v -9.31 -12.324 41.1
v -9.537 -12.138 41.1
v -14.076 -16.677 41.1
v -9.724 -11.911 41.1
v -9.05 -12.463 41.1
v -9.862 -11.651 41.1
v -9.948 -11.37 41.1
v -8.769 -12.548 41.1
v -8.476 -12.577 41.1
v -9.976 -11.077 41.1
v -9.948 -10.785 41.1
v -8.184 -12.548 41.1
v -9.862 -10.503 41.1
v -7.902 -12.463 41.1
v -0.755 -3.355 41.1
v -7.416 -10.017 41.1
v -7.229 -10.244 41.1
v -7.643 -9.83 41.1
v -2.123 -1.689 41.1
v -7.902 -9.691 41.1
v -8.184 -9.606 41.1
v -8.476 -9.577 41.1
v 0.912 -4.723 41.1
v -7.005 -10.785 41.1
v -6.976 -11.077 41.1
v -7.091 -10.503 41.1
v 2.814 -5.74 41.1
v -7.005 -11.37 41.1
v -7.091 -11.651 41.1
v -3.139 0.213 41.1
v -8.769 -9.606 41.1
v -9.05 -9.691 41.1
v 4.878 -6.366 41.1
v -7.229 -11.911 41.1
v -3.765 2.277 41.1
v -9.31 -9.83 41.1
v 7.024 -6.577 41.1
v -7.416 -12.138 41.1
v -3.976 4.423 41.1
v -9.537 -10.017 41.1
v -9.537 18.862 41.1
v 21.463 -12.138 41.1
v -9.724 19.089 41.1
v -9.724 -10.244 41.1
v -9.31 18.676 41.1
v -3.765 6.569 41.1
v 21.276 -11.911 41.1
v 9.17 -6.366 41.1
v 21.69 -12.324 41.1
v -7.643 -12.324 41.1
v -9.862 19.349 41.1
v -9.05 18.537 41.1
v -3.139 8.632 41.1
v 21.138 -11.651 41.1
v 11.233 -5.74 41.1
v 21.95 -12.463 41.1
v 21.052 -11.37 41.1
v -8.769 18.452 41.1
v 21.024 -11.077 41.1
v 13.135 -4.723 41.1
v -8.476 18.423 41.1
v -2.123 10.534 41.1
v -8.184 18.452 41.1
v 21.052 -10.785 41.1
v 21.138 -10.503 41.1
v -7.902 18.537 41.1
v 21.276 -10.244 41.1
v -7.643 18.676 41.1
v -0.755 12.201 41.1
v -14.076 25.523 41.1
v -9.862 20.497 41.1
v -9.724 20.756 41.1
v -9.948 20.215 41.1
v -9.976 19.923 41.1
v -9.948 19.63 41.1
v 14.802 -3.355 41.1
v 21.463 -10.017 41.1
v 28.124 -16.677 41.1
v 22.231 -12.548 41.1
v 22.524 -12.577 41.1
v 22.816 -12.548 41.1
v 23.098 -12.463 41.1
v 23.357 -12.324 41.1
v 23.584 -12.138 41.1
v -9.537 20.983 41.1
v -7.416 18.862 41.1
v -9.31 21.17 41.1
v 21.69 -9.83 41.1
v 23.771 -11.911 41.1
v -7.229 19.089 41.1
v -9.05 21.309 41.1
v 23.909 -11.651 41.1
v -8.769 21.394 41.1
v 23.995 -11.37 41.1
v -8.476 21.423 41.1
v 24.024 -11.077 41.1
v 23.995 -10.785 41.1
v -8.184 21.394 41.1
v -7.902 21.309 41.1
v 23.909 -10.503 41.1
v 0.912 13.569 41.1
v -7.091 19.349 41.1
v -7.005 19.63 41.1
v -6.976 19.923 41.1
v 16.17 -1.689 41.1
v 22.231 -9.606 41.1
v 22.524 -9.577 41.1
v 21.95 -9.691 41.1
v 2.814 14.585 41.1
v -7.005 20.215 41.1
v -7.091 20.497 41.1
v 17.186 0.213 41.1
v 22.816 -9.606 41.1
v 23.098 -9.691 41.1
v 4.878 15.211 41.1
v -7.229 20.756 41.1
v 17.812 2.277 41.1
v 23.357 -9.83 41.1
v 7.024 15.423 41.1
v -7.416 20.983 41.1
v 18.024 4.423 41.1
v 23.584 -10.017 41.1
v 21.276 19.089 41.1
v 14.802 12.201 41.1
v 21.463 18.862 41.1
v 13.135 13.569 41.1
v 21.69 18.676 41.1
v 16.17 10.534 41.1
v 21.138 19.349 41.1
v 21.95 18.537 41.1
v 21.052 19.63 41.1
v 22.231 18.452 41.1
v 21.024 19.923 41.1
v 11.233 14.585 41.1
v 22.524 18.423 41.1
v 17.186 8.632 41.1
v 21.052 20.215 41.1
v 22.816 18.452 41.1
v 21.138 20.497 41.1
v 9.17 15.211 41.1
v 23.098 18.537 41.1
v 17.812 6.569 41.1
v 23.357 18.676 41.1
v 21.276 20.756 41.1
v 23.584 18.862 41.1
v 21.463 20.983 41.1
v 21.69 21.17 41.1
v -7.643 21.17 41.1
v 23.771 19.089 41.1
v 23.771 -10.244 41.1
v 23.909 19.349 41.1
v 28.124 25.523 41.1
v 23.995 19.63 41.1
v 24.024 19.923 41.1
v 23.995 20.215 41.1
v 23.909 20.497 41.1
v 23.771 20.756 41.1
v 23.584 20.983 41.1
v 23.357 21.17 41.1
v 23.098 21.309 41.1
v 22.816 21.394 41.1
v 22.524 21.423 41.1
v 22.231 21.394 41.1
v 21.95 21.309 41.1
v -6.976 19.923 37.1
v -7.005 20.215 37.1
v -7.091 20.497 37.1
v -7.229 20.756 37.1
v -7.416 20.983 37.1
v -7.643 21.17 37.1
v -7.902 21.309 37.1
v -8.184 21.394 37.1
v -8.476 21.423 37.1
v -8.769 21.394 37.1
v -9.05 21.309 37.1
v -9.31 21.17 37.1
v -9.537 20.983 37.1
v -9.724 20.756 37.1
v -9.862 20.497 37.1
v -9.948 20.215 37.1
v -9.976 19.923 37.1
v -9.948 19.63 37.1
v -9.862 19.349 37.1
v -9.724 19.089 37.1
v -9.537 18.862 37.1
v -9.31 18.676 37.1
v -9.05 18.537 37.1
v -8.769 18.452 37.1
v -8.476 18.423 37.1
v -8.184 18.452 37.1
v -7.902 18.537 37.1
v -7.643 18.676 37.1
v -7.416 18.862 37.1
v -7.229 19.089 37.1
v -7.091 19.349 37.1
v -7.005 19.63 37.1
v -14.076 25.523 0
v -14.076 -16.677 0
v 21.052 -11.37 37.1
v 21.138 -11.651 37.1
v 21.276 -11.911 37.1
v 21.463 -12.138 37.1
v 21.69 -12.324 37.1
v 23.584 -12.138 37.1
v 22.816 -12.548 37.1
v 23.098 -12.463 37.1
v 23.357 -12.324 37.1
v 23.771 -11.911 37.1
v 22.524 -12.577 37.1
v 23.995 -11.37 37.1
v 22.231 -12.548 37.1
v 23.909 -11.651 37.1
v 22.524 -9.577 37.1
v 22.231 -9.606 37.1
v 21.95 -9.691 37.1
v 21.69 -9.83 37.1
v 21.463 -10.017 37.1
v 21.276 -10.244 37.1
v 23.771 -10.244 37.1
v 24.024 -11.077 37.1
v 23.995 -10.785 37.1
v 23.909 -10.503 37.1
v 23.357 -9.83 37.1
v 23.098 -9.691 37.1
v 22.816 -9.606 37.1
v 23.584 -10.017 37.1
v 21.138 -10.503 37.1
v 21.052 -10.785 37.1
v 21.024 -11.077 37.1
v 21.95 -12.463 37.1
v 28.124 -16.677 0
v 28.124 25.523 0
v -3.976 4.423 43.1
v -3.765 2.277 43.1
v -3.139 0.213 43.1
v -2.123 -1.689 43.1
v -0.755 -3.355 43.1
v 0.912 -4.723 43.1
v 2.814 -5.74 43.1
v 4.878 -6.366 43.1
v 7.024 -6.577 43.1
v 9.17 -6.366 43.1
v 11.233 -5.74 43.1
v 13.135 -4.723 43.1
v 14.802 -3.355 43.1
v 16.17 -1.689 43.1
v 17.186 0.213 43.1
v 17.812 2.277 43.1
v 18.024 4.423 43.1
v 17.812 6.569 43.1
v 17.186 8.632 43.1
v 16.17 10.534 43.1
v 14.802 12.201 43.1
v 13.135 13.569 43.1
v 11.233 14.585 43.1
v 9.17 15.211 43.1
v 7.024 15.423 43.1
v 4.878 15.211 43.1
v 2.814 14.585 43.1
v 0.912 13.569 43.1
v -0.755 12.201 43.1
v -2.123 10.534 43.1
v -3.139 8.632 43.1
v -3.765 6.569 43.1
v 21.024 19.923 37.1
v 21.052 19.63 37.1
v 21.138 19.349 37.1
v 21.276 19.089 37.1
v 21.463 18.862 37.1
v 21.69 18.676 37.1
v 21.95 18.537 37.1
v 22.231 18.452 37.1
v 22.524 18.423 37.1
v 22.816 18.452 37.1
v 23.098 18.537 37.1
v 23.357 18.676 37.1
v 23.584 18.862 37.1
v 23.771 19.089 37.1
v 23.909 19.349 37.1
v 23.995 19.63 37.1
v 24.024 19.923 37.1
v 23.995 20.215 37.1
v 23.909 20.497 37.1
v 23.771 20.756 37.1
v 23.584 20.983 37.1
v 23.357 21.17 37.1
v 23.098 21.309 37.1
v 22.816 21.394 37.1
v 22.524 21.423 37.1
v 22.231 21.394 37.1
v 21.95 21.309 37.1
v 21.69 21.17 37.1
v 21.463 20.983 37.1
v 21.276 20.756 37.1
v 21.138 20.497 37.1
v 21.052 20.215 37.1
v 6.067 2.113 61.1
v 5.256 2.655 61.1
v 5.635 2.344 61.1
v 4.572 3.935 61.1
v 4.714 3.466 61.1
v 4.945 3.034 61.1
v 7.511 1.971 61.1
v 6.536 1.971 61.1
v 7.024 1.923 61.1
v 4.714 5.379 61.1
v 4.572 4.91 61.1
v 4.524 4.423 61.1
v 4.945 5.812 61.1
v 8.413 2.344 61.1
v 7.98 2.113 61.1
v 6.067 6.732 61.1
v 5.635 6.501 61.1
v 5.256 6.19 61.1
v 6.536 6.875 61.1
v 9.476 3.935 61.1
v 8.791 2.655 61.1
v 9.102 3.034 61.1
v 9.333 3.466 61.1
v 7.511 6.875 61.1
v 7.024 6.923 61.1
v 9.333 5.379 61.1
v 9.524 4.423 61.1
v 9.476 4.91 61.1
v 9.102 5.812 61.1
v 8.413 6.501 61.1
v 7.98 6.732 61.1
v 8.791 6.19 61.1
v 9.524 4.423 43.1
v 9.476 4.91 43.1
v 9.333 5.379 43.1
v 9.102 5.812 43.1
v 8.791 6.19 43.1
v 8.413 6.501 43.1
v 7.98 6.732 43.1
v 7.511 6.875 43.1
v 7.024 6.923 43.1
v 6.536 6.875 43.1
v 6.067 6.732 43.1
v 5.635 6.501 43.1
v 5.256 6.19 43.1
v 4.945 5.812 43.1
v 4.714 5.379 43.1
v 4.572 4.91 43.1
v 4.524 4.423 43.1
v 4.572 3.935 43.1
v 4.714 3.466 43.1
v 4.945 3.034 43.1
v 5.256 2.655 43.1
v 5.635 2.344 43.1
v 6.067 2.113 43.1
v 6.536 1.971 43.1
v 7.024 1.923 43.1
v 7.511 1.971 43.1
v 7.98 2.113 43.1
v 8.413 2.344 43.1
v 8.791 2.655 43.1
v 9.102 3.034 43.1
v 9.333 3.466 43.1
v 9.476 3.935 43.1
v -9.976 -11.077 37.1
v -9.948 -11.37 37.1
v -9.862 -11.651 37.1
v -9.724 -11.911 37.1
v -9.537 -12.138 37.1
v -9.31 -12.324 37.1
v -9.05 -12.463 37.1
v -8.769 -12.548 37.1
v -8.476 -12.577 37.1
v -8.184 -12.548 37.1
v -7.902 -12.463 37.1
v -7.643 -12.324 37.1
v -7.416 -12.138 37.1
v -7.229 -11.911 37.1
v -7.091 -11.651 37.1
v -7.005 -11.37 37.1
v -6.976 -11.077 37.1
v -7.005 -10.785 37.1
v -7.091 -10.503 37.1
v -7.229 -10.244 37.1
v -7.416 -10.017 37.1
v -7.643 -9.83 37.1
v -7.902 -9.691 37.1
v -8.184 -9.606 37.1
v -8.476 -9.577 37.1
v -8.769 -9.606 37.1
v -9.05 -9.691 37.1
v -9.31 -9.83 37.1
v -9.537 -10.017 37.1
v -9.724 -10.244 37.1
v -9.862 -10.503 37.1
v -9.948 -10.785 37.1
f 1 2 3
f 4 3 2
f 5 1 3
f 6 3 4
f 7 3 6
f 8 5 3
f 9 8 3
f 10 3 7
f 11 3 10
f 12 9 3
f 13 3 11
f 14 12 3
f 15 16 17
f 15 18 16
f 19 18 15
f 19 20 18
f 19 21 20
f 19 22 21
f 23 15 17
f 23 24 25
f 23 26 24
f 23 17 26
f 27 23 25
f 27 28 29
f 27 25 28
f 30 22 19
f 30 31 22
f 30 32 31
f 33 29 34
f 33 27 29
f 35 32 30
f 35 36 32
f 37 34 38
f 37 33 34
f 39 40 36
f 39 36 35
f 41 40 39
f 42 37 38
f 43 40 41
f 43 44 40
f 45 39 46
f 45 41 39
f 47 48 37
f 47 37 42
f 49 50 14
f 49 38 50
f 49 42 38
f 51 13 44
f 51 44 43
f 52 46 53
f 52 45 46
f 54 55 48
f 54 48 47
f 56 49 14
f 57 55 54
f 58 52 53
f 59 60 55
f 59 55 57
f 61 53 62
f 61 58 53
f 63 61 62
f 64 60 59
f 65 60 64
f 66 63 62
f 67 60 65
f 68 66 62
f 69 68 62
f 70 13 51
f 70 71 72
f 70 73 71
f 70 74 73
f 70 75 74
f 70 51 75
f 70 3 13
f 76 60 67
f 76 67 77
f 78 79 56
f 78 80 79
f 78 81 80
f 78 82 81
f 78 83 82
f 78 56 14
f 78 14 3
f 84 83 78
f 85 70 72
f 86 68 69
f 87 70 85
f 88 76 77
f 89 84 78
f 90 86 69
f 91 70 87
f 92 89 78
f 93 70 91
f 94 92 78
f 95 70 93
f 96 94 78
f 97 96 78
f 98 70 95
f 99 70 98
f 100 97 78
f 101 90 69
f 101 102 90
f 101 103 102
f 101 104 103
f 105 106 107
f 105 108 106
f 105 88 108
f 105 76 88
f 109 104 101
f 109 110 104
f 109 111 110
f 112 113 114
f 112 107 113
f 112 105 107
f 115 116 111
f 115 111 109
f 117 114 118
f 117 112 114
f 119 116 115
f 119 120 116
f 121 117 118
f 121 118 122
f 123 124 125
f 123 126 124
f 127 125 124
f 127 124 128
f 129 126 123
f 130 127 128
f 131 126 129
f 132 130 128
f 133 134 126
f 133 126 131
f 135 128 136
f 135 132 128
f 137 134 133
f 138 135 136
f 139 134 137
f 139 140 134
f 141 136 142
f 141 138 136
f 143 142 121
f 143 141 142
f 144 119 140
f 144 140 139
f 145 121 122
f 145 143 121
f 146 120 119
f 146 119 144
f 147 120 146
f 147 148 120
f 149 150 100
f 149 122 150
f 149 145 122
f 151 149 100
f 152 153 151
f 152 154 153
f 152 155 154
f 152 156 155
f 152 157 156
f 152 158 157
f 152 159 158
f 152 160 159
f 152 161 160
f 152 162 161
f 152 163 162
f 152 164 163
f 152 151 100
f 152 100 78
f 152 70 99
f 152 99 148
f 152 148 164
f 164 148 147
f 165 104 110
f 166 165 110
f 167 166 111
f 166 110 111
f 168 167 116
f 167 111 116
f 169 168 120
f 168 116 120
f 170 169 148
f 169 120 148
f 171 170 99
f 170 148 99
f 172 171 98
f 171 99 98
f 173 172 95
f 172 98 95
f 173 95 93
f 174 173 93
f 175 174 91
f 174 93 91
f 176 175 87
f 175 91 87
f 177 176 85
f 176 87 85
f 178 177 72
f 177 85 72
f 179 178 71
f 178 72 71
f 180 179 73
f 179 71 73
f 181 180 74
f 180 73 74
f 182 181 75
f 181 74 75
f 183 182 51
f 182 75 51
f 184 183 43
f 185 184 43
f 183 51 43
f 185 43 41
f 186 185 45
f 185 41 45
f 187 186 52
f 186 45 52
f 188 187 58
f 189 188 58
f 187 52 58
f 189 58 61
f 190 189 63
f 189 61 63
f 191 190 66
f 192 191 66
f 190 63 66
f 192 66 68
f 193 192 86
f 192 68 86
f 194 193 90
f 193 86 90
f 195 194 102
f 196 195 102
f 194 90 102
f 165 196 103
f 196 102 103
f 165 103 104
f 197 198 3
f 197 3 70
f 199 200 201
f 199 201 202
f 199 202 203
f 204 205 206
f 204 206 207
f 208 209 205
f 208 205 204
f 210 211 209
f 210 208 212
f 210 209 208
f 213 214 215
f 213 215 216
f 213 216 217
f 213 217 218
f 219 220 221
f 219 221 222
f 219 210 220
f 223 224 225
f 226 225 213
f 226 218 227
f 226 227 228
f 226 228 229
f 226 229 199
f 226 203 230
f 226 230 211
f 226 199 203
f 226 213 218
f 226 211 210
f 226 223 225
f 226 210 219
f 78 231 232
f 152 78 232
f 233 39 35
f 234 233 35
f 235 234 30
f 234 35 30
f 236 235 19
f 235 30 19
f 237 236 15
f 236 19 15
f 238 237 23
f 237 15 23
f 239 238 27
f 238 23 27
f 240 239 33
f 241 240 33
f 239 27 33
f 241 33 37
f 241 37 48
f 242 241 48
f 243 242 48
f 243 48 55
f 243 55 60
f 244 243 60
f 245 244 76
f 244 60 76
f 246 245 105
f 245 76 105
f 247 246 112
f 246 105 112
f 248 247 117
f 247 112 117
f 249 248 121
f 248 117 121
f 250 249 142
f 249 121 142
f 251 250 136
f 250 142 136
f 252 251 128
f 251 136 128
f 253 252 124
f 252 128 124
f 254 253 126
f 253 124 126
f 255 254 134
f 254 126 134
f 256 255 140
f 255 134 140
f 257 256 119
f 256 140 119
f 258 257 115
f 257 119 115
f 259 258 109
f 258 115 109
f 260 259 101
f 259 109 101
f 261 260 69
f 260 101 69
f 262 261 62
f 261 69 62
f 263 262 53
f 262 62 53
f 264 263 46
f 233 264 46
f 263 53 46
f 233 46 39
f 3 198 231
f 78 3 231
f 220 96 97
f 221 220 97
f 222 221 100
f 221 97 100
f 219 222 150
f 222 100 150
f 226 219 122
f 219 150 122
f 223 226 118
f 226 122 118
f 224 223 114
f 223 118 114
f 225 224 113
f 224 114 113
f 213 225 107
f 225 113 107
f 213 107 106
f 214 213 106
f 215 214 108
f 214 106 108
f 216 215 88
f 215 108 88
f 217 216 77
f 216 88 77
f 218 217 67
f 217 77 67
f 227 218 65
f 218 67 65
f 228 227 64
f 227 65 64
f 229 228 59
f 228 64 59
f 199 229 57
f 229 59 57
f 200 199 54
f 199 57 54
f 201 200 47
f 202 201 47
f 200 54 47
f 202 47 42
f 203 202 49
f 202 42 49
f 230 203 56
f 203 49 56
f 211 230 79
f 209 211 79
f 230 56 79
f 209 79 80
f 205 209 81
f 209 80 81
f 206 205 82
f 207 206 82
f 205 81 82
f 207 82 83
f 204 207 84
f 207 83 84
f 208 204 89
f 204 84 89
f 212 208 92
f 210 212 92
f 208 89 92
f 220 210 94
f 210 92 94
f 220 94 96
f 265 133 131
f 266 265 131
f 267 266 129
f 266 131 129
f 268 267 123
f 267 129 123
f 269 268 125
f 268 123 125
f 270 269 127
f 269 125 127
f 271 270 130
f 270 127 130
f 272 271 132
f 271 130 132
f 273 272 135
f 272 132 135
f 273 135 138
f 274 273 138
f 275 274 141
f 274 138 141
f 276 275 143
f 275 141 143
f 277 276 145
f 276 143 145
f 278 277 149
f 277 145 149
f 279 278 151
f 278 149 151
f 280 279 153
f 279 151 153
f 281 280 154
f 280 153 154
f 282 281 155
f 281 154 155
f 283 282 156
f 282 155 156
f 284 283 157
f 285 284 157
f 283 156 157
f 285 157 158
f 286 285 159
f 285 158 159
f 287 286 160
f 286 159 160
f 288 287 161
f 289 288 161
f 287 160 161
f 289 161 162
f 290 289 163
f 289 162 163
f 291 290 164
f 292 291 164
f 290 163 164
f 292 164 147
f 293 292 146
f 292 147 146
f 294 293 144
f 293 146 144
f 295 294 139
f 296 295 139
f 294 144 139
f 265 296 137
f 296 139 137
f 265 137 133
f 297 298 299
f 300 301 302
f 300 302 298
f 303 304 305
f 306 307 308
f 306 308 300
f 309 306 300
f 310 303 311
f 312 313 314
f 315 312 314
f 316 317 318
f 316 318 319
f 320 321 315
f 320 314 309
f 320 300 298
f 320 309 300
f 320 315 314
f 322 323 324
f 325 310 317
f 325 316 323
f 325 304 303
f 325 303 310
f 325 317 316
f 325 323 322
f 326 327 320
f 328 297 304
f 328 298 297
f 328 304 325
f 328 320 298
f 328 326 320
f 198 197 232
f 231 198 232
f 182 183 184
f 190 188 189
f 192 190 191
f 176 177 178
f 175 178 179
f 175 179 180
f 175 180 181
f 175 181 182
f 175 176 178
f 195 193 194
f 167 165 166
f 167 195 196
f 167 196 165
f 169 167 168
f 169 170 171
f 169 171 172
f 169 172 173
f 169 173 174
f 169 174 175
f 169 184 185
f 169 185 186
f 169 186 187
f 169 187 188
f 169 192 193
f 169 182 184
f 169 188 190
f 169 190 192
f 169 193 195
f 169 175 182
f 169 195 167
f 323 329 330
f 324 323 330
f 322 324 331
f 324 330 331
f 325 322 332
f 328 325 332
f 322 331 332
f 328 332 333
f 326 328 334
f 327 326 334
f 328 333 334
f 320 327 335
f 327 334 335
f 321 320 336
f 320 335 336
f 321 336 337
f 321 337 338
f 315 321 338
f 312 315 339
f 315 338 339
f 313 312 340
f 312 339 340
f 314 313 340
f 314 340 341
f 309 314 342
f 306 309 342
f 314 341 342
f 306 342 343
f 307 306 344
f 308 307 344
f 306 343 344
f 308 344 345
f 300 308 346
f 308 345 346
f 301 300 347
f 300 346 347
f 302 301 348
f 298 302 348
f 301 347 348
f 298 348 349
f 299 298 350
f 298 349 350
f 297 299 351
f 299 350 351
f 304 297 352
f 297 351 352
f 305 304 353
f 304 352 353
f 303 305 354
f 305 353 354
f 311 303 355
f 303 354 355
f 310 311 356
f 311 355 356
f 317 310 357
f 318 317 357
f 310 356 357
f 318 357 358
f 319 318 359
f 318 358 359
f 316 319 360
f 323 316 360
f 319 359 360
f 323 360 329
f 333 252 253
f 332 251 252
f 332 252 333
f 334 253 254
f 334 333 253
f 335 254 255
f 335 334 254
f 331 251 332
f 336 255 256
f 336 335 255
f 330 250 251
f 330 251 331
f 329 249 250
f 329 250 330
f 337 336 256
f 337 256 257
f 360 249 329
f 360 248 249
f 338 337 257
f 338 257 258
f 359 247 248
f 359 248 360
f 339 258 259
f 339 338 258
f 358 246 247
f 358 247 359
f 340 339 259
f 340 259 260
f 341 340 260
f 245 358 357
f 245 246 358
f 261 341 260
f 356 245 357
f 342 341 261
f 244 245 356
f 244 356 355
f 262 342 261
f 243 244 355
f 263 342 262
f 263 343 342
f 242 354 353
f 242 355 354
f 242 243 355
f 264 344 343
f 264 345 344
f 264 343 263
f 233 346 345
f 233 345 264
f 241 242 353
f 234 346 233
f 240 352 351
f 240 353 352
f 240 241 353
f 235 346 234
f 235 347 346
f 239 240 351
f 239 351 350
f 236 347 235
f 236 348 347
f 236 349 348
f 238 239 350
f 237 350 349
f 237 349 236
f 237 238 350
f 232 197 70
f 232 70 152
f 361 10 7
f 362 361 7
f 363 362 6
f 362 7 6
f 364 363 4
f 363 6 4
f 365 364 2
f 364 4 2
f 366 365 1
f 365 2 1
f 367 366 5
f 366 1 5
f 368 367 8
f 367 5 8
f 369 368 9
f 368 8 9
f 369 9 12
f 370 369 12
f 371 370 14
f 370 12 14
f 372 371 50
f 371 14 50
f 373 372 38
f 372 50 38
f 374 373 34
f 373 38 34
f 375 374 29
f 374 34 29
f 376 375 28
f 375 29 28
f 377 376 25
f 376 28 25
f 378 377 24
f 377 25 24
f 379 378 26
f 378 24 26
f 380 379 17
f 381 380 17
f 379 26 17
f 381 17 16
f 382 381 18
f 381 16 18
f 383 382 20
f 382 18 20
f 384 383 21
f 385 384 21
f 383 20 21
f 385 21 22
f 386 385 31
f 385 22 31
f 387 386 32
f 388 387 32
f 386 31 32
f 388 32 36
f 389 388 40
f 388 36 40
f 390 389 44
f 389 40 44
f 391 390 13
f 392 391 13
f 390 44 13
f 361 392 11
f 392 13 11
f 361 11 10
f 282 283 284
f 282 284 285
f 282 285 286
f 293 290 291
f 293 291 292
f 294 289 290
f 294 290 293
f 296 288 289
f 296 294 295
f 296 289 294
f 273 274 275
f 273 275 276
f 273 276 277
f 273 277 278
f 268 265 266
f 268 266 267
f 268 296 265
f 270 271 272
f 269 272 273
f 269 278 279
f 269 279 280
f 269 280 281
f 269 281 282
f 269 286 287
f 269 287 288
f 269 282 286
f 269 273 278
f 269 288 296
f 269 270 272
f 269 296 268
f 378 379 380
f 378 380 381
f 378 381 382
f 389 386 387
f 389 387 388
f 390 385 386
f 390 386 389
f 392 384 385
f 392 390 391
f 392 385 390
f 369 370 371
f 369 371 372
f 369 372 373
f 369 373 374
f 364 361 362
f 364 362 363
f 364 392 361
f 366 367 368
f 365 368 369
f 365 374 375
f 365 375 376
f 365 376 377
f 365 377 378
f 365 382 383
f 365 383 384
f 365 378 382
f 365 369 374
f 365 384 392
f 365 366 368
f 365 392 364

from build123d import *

# Parameters (mm, degrees)
ESQUISSE1_W      = 42.2
ESQUISSE1_H      = 42.2
EXTRUSION1_DEPTH = 41.1
ESQUISSE2_R      = 11
EXTRUSION2_DEPTH = 2
ESQUISSE3_R      = 2.5
EXTRUSION3_DEPTH = 18
ESQUISSE4_R      = 1.5
EXTRUSION4_DEPTH = 4


with BuildPart() as part:
    # Esquisse1 → Extrusion1 (new body)
    with BuildSketch(Plane.XY):
        with Locations((7.023594794, 4.422730203)):
            Rectangle(ESQUISSE1_W, ESQUISSE1_H)
    extrude(amount=EXTRUSION1_DEPTH)

    # Esquisse2 → Extrusion2 (add)
    with BuildSketch(Plane.XY.offset(41.1)):
        with Locations(Location((7.023594794, 4.422730203, 0), (0, 0, 180))):
            Circle(ESQUISSE2_R)
    extrude(amount=EXTRUSION2_DEPTH)

    # Esquisse3 → Extrusion3 (add)
    with BuildSketch(Plane.XY.offset(43.1)):
        with Locations((7.023594794, 4.422730203)):
            Circle(ESQUISSE3_R)
    extrude(amount=EXTRUSION3_DEPTH)

    # Esquisse4 → Extrusion4 (cut)
    with BuildSketch(Plane.XY.offset(41.1)):
        with Locations((-8.476405206, 19.922730203)):
            Circle(ESQUISSE4_R)
        with Locations(Location((22.523594794, 19.922730203, 0), (0, 0, 180))):
            Circle(ESQUISSE4_R)
        with Locations((22.523594794, -11.077269797)):
            Circle(ESQUISSE4_R)
        with Locations(Location((-8.476405206, -11.077269797, 0), (0, 0, 180))):
            Circle(ESQUISSE4_R)
    extrude(amount=-EXTRUSION4_DEPTH, mode=Mode.SUBTRACT)


solid = part.part
